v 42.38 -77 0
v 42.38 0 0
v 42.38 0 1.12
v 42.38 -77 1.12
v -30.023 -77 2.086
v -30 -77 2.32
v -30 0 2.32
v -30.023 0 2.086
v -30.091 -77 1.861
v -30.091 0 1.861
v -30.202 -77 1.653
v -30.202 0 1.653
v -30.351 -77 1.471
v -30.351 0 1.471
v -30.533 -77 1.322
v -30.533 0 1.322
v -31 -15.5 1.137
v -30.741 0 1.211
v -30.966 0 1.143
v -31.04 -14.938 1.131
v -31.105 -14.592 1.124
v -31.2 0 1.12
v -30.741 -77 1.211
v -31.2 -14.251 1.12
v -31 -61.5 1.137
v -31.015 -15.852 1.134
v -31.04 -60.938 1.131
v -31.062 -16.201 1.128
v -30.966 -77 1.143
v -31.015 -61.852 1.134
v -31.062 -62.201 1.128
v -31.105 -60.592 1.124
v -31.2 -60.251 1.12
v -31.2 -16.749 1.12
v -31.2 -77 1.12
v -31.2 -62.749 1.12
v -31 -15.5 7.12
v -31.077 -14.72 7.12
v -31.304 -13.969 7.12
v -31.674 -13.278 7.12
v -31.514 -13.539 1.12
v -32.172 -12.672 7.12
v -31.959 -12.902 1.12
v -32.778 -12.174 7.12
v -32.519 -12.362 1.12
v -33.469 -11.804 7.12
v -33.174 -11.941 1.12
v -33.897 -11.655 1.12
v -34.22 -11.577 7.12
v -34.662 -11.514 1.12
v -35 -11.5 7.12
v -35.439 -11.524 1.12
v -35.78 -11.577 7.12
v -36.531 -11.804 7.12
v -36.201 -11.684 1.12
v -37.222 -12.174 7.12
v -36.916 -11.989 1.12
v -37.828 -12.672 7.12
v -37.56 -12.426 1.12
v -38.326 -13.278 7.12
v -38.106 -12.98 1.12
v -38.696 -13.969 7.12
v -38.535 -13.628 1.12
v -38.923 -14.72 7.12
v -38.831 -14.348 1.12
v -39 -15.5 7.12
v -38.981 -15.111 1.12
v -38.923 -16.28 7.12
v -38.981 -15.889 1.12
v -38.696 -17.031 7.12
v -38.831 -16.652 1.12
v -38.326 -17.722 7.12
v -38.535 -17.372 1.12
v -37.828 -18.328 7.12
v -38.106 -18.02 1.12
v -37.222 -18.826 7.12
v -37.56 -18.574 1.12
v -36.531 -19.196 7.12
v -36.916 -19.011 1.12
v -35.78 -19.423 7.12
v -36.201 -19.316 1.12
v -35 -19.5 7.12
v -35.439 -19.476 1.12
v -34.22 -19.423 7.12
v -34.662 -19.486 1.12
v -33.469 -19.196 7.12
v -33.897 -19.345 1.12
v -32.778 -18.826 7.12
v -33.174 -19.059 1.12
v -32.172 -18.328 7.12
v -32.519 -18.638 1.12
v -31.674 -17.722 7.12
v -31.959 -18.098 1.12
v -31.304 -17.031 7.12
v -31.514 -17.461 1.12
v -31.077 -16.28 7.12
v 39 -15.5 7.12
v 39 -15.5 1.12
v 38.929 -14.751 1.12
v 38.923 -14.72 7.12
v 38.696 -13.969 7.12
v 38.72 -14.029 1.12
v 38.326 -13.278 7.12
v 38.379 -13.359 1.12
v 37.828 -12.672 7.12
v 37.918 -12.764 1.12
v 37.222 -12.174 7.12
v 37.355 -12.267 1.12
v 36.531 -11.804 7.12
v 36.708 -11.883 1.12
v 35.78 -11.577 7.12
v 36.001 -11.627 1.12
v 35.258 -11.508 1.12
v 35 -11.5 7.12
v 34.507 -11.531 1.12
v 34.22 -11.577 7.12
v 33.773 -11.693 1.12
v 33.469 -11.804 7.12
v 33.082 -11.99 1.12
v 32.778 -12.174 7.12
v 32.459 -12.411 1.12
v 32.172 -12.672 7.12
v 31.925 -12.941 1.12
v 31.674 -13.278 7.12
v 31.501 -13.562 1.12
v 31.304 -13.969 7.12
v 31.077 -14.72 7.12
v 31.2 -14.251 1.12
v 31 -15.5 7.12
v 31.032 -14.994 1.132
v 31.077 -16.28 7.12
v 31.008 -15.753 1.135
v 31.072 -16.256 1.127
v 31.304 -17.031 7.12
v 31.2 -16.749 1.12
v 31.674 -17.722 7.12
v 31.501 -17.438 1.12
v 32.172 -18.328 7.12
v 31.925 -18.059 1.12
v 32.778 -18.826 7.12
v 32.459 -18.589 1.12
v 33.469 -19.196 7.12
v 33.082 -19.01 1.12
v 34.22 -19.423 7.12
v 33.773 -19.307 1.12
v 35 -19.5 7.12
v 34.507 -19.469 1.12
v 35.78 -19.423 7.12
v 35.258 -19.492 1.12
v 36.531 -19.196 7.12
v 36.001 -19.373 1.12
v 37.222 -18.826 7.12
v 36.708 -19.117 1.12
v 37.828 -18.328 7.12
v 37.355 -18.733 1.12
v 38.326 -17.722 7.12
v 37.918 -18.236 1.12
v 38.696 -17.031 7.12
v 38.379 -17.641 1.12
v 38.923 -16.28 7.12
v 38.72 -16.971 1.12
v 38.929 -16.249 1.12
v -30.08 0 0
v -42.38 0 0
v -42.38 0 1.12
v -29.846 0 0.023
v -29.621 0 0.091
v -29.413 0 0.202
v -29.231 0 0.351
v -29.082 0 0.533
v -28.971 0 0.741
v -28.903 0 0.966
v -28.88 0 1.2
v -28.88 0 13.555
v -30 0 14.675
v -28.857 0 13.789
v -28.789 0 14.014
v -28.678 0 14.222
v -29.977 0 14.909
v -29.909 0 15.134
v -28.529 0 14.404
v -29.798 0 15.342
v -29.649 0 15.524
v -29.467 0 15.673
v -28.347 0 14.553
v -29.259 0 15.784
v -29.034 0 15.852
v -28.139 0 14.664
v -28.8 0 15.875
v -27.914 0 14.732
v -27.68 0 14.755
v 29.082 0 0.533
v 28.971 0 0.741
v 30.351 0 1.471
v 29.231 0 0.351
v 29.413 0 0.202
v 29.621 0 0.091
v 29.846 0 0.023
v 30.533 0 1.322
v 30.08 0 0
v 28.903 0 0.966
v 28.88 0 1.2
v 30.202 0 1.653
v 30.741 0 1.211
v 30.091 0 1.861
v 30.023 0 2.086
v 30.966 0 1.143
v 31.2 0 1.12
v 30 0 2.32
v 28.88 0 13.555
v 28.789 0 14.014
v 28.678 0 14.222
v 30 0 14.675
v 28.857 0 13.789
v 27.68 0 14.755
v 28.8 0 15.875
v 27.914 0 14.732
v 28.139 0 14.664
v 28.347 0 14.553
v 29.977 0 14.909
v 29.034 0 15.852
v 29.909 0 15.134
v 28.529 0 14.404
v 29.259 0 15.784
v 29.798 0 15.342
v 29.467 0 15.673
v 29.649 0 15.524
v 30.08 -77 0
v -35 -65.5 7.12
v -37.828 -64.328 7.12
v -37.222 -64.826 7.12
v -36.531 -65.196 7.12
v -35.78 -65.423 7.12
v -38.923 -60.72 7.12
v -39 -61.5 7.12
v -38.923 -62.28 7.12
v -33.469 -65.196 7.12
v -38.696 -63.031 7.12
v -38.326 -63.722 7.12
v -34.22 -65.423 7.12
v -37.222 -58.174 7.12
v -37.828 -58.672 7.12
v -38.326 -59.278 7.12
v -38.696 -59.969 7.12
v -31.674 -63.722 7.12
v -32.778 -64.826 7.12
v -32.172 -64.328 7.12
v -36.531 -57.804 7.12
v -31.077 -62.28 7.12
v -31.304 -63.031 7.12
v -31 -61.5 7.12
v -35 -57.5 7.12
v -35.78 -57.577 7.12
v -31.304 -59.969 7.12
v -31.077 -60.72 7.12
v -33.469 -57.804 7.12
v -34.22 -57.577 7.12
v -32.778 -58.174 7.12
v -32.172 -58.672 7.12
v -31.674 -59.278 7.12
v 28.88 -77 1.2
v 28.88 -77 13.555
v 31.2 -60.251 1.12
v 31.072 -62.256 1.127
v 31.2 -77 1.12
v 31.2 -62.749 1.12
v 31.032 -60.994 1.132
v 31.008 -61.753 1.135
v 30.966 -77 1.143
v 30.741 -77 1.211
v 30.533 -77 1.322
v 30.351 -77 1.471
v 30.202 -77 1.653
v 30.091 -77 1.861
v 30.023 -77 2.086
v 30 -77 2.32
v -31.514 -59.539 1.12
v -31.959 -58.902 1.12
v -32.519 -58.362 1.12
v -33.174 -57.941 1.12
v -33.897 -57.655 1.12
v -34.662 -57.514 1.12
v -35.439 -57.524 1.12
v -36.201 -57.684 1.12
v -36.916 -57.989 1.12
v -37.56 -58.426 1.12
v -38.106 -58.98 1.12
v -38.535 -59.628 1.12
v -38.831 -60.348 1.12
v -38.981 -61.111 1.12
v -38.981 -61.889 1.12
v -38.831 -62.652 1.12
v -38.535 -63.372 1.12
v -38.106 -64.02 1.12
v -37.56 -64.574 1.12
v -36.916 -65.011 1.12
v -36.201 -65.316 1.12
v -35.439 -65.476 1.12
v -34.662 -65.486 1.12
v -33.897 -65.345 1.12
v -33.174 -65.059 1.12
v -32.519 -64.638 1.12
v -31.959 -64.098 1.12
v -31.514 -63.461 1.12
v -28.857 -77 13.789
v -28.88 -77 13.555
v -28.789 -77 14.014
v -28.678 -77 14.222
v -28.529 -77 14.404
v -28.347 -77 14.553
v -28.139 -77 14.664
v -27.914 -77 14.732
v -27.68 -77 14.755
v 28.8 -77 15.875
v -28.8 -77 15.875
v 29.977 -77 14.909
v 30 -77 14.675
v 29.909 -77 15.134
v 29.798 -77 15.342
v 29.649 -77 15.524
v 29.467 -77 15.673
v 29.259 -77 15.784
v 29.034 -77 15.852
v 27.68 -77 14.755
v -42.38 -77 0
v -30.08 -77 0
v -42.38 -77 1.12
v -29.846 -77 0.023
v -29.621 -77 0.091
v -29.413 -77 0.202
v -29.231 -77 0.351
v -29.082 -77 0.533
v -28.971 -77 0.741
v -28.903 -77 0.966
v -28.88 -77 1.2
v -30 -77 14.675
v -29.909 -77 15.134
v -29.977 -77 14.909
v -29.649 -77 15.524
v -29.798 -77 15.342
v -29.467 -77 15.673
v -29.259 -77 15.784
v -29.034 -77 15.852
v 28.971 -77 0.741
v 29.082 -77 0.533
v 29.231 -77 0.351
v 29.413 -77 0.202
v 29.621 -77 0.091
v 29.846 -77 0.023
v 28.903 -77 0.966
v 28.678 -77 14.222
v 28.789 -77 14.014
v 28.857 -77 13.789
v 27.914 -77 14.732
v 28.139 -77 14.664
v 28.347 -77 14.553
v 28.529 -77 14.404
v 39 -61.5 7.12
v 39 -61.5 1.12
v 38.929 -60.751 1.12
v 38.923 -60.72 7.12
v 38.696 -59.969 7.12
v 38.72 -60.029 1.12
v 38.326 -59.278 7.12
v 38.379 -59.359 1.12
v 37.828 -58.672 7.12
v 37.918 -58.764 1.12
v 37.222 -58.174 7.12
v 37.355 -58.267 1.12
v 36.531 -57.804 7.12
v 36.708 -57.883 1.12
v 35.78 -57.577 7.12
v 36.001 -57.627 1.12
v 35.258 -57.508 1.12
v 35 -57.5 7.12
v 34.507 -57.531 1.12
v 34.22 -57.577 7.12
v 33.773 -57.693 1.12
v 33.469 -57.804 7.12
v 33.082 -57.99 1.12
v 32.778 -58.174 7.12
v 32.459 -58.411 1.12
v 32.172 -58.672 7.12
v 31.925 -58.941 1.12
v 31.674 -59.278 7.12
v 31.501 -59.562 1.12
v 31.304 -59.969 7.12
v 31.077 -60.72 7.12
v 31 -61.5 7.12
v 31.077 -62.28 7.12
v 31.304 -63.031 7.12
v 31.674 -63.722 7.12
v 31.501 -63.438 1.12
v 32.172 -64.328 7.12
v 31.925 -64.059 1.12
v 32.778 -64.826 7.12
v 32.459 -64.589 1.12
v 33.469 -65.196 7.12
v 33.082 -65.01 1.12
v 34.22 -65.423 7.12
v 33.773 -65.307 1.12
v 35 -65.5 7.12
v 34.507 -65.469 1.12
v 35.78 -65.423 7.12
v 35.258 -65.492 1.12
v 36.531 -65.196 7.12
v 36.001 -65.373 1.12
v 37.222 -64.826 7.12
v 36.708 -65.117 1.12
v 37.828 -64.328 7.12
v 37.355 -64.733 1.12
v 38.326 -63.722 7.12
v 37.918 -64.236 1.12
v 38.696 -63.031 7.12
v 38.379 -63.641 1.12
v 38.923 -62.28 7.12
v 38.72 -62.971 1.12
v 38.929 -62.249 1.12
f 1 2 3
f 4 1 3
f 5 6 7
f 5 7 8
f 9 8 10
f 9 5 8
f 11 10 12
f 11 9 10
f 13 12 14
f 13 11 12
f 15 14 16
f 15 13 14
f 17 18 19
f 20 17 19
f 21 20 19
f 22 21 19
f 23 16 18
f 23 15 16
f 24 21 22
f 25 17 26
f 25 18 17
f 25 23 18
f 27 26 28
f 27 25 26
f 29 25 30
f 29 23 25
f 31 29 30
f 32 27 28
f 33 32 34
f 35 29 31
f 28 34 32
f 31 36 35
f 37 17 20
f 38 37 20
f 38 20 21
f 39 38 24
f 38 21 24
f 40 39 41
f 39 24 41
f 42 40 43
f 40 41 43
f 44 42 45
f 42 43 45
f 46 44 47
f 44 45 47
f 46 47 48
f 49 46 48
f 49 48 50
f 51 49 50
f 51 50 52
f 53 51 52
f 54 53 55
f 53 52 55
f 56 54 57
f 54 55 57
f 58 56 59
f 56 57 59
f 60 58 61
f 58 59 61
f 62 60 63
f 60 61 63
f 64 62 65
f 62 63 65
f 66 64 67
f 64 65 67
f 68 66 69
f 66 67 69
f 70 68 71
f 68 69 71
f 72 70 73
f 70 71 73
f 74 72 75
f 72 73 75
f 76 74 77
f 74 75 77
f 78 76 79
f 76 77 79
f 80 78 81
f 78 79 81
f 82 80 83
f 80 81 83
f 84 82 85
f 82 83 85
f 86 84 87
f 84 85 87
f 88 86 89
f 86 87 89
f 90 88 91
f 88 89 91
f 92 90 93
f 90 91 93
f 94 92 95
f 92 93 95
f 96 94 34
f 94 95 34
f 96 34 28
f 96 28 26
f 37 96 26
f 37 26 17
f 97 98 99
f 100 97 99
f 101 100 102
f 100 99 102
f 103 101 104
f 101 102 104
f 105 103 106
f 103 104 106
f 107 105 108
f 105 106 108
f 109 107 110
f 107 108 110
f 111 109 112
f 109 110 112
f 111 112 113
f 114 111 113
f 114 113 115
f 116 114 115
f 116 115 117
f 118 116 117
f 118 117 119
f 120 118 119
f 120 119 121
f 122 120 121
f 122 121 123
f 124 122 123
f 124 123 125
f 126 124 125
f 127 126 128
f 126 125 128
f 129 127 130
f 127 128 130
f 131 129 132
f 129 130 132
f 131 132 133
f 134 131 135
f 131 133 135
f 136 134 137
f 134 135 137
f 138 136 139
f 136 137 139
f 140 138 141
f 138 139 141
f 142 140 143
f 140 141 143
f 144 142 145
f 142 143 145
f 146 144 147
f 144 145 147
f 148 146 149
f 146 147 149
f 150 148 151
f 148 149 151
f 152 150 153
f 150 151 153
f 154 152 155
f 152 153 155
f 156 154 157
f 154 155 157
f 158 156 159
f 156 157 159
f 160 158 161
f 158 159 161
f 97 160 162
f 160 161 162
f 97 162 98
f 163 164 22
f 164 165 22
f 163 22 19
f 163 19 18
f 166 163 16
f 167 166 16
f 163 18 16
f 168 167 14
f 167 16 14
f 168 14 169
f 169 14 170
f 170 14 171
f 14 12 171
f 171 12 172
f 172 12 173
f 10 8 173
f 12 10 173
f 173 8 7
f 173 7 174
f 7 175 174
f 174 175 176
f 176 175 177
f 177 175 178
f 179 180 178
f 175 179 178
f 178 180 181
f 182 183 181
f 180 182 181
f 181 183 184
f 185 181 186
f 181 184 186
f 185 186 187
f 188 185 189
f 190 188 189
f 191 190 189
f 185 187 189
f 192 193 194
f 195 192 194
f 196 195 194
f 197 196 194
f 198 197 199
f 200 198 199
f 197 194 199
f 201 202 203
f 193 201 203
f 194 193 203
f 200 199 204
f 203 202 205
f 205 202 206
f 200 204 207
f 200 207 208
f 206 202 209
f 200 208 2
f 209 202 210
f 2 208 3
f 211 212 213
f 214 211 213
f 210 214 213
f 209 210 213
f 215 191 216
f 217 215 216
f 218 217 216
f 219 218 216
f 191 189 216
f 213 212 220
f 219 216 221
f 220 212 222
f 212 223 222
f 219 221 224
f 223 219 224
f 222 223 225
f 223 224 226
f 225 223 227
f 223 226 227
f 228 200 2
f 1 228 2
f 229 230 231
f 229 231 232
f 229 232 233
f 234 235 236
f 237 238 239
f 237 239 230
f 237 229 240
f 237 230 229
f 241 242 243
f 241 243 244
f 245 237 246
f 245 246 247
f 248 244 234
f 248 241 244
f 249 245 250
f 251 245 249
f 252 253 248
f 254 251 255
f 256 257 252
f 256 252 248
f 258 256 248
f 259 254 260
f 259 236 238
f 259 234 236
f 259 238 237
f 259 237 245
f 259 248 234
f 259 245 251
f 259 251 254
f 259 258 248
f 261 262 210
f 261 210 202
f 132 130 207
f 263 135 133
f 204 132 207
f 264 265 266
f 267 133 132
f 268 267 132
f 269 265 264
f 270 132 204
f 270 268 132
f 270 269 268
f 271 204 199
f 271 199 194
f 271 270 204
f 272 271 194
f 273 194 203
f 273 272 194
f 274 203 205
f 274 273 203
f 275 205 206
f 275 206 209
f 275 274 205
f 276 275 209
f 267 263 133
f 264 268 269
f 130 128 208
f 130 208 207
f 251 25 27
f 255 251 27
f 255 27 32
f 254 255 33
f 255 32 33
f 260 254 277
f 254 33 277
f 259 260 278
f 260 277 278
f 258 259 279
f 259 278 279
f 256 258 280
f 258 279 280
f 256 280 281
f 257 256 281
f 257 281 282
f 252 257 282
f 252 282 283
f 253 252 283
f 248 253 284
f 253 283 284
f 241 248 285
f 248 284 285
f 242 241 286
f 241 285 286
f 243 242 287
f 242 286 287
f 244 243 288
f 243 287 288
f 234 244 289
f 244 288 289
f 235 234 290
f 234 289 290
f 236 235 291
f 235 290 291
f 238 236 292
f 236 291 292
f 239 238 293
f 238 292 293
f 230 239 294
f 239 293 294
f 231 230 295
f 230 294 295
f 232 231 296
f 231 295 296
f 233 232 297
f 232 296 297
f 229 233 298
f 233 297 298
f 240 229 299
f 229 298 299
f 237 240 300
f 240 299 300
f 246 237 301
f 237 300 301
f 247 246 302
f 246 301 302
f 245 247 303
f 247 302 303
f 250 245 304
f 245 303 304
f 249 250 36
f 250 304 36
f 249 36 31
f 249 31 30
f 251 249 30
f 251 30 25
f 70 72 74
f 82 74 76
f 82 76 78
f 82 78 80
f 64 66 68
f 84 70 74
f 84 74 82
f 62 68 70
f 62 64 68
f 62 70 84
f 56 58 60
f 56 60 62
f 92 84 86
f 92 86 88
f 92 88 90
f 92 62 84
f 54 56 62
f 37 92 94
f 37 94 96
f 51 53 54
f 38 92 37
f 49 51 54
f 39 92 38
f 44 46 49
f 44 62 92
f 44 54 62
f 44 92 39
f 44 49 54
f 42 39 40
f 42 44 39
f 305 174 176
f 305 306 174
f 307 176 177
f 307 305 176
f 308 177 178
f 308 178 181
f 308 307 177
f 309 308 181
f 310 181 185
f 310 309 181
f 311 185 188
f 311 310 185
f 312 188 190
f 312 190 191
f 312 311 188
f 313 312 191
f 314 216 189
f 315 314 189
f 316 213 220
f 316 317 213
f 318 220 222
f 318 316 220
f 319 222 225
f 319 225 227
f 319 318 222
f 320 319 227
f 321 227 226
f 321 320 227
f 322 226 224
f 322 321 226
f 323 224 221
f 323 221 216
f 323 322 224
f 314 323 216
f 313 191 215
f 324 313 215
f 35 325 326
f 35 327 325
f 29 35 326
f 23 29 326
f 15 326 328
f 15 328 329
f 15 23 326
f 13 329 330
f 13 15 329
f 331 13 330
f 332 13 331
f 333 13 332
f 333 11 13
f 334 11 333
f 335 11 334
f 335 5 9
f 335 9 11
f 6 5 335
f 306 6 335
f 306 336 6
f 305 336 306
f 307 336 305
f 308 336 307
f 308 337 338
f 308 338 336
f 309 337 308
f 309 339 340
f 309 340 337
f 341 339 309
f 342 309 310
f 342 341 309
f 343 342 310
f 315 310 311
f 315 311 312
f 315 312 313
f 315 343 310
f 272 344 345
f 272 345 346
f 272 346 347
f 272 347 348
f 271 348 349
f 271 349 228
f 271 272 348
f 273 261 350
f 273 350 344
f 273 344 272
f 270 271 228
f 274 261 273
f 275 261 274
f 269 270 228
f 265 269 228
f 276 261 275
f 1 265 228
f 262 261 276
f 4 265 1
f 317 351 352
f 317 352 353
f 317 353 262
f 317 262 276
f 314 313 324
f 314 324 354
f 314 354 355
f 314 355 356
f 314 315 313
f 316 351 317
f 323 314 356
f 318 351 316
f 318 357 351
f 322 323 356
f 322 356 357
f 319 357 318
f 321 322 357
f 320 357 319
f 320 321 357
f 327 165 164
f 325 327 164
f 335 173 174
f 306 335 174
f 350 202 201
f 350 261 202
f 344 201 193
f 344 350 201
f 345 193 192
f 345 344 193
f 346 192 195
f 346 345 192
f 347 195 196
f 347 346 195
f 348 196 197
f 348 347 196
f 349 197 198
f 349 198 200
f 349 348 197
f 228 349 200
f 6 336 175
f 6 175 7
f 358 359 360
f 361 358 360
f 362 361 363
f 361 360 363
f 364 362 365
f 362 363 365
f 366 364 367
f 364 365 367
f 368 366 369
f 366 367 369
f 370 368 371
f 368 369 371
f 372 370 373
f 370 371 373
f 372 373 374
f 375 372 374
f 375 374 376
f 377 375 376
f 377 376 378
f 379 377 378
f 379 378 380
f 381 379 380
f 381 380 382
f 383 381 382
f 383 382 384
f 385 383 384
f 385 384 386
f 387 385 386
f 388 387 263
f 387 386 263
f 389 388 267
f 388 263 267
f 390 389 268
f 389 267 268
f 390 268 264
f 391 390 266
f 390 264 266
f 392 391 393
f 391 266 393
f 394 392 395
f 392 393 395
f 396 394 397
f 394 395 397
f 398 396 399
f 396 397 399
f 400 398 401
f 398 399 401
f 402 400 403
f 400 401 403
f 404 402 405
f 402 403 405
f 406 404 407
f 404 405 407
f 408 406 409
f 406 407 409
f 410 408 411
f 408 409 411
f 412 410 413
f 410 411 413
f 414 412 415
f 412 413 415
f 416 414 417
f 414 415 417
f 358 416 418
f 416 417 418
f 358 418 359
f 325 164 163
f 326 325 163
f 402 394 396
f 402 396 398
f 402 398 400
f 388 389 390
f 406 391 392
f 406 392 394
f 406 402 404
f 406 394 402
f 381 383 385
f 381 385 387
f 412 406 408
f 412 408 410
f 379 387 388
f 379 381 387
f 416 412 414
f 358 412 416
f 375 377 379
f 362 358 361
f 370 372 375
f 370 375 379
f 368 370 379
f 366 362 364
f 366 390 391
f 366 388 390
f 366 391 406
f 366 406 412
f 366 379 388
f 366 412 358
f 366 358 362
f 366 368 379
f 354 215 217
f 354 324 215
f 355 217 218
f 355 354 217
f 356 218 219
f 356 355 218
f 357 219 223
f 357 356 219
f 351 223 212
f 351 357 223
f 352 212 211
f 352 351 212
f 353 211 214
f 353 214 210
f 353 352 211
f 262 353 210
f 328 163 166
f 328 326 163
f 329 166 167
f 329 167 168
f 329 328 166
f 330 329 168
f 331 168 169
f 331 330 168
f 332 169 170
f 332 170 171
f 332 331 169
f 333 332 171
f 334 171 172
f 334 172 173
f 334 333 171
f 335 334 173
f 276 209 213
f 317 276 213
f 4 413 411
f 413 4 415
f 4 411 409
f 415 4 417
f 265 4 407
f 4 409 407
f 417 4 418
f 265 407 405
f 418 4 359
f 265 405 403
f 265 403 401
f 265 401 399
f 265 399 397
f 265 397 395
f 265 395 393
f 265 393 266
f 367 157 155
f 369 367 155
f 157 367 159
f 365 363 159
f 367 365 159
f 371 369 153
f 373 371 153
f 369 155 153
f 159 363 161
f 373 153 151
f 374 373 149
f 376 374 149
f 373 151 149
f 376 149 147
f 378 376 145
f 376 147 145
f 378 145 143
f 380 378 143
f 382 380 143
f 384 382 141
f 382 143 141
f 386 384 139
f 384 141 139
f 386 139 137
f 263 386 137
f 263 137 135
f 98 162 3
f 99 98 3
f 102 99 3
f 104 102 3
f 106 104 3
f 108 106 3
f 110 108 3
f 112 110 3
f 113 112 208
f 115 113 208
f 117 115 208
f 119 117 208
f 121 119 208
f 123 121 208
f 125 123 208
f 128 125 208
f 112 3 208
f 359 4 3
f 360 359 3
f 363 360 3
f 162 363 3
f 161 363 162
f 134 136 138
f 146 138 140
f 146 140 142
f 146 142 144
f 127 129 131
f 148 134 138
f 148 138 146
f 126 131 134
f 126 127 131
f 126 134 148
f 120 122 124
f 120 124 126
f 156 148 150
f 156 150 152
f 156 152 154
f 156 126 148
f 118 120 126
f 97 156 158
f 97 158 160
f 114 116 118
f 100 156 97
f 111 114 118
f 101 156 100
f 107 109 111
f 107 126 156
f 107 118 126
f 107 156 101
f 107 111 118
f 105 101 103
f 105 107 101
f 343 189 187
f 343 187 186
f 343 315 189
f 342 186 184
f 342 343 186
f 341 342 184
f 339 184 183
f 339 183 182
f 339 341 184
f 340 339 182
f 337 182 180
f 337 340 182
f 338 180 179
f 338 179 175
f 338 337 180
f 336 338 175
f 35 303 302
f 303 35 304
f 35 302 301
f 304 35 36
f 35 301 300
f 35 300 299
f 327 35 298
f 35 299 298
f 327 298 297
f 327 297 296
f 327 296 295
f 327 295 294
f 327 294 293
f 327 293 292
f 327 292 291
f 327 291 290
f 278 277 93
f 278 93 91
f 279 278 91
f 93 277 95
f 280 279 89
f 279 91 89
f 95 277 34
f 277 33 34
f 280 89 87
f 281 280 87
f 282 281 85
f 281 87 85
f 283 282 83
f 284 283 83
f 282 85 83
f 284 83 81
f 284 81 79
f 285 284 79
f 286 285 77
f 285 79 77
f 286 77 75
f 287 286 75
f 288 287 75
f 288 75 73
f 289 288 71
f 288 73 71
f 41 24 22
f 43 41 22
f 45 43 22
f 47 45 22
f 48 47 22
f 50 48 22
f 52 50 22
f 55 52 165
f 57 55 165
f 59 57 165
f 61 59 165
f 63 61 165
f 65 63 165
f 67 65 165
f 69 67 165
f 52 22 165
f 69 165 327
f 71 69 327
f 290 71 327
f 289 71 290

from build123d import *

# Parameters (mm, degrees)
F1_DEPTH = 77
F2_R     = 1.2
F3_R     = 4
F4_DEPTH = 6


with BuildPart() as f1:
    # F0 (on Front) → F1 (new body)
    with BuildSketch(Plane.XZ):
        Polygon((-42.38, 1.12), (-42.38, 0), (-28.88, 0), (-28.88, 14.755), (28.88, 14.755), (28.88, 0), (42.38, 0), (42.38, 1.12), (30, 1.12), (30, 15.875), (-30, 15.875), (-30, 1.12), align=None)
    extrude(amount=F1_DEPTH)

    # F2
    f2_edges = [f1.edges().sort_by_distance(p)[0] for p in [
        (-30, -38.5, 15.875),
        (30, -38.5, 15.875),
        (28.88, -38.5, 0),
        (-28.88, -38.5, 0),
        (28.88, -38.5, 14.755),
        (-28.88, -38.5, 14.755),
        (-30, -38.5, 1.12),
        (30, -38.5, 1.12),
    ]]
    fillet(f2_edges, radius=F2_R)

    # F3 (on face) → F4 (join)
    with BuildSketch(Plane.XY.offset(1.12)):
        with Locations((35, -15.5)):
            Circle(F3_R)
        with Locations((35, -61.5)):
            Circle(F3_R)
        with Locations((-35, -15.5)):
            Circle(F3_R)
        with Locations((-35, -61.5)):
            Circle(F3_R)
    extrude(amount=F4_DEPTH)


solid = f1.part
